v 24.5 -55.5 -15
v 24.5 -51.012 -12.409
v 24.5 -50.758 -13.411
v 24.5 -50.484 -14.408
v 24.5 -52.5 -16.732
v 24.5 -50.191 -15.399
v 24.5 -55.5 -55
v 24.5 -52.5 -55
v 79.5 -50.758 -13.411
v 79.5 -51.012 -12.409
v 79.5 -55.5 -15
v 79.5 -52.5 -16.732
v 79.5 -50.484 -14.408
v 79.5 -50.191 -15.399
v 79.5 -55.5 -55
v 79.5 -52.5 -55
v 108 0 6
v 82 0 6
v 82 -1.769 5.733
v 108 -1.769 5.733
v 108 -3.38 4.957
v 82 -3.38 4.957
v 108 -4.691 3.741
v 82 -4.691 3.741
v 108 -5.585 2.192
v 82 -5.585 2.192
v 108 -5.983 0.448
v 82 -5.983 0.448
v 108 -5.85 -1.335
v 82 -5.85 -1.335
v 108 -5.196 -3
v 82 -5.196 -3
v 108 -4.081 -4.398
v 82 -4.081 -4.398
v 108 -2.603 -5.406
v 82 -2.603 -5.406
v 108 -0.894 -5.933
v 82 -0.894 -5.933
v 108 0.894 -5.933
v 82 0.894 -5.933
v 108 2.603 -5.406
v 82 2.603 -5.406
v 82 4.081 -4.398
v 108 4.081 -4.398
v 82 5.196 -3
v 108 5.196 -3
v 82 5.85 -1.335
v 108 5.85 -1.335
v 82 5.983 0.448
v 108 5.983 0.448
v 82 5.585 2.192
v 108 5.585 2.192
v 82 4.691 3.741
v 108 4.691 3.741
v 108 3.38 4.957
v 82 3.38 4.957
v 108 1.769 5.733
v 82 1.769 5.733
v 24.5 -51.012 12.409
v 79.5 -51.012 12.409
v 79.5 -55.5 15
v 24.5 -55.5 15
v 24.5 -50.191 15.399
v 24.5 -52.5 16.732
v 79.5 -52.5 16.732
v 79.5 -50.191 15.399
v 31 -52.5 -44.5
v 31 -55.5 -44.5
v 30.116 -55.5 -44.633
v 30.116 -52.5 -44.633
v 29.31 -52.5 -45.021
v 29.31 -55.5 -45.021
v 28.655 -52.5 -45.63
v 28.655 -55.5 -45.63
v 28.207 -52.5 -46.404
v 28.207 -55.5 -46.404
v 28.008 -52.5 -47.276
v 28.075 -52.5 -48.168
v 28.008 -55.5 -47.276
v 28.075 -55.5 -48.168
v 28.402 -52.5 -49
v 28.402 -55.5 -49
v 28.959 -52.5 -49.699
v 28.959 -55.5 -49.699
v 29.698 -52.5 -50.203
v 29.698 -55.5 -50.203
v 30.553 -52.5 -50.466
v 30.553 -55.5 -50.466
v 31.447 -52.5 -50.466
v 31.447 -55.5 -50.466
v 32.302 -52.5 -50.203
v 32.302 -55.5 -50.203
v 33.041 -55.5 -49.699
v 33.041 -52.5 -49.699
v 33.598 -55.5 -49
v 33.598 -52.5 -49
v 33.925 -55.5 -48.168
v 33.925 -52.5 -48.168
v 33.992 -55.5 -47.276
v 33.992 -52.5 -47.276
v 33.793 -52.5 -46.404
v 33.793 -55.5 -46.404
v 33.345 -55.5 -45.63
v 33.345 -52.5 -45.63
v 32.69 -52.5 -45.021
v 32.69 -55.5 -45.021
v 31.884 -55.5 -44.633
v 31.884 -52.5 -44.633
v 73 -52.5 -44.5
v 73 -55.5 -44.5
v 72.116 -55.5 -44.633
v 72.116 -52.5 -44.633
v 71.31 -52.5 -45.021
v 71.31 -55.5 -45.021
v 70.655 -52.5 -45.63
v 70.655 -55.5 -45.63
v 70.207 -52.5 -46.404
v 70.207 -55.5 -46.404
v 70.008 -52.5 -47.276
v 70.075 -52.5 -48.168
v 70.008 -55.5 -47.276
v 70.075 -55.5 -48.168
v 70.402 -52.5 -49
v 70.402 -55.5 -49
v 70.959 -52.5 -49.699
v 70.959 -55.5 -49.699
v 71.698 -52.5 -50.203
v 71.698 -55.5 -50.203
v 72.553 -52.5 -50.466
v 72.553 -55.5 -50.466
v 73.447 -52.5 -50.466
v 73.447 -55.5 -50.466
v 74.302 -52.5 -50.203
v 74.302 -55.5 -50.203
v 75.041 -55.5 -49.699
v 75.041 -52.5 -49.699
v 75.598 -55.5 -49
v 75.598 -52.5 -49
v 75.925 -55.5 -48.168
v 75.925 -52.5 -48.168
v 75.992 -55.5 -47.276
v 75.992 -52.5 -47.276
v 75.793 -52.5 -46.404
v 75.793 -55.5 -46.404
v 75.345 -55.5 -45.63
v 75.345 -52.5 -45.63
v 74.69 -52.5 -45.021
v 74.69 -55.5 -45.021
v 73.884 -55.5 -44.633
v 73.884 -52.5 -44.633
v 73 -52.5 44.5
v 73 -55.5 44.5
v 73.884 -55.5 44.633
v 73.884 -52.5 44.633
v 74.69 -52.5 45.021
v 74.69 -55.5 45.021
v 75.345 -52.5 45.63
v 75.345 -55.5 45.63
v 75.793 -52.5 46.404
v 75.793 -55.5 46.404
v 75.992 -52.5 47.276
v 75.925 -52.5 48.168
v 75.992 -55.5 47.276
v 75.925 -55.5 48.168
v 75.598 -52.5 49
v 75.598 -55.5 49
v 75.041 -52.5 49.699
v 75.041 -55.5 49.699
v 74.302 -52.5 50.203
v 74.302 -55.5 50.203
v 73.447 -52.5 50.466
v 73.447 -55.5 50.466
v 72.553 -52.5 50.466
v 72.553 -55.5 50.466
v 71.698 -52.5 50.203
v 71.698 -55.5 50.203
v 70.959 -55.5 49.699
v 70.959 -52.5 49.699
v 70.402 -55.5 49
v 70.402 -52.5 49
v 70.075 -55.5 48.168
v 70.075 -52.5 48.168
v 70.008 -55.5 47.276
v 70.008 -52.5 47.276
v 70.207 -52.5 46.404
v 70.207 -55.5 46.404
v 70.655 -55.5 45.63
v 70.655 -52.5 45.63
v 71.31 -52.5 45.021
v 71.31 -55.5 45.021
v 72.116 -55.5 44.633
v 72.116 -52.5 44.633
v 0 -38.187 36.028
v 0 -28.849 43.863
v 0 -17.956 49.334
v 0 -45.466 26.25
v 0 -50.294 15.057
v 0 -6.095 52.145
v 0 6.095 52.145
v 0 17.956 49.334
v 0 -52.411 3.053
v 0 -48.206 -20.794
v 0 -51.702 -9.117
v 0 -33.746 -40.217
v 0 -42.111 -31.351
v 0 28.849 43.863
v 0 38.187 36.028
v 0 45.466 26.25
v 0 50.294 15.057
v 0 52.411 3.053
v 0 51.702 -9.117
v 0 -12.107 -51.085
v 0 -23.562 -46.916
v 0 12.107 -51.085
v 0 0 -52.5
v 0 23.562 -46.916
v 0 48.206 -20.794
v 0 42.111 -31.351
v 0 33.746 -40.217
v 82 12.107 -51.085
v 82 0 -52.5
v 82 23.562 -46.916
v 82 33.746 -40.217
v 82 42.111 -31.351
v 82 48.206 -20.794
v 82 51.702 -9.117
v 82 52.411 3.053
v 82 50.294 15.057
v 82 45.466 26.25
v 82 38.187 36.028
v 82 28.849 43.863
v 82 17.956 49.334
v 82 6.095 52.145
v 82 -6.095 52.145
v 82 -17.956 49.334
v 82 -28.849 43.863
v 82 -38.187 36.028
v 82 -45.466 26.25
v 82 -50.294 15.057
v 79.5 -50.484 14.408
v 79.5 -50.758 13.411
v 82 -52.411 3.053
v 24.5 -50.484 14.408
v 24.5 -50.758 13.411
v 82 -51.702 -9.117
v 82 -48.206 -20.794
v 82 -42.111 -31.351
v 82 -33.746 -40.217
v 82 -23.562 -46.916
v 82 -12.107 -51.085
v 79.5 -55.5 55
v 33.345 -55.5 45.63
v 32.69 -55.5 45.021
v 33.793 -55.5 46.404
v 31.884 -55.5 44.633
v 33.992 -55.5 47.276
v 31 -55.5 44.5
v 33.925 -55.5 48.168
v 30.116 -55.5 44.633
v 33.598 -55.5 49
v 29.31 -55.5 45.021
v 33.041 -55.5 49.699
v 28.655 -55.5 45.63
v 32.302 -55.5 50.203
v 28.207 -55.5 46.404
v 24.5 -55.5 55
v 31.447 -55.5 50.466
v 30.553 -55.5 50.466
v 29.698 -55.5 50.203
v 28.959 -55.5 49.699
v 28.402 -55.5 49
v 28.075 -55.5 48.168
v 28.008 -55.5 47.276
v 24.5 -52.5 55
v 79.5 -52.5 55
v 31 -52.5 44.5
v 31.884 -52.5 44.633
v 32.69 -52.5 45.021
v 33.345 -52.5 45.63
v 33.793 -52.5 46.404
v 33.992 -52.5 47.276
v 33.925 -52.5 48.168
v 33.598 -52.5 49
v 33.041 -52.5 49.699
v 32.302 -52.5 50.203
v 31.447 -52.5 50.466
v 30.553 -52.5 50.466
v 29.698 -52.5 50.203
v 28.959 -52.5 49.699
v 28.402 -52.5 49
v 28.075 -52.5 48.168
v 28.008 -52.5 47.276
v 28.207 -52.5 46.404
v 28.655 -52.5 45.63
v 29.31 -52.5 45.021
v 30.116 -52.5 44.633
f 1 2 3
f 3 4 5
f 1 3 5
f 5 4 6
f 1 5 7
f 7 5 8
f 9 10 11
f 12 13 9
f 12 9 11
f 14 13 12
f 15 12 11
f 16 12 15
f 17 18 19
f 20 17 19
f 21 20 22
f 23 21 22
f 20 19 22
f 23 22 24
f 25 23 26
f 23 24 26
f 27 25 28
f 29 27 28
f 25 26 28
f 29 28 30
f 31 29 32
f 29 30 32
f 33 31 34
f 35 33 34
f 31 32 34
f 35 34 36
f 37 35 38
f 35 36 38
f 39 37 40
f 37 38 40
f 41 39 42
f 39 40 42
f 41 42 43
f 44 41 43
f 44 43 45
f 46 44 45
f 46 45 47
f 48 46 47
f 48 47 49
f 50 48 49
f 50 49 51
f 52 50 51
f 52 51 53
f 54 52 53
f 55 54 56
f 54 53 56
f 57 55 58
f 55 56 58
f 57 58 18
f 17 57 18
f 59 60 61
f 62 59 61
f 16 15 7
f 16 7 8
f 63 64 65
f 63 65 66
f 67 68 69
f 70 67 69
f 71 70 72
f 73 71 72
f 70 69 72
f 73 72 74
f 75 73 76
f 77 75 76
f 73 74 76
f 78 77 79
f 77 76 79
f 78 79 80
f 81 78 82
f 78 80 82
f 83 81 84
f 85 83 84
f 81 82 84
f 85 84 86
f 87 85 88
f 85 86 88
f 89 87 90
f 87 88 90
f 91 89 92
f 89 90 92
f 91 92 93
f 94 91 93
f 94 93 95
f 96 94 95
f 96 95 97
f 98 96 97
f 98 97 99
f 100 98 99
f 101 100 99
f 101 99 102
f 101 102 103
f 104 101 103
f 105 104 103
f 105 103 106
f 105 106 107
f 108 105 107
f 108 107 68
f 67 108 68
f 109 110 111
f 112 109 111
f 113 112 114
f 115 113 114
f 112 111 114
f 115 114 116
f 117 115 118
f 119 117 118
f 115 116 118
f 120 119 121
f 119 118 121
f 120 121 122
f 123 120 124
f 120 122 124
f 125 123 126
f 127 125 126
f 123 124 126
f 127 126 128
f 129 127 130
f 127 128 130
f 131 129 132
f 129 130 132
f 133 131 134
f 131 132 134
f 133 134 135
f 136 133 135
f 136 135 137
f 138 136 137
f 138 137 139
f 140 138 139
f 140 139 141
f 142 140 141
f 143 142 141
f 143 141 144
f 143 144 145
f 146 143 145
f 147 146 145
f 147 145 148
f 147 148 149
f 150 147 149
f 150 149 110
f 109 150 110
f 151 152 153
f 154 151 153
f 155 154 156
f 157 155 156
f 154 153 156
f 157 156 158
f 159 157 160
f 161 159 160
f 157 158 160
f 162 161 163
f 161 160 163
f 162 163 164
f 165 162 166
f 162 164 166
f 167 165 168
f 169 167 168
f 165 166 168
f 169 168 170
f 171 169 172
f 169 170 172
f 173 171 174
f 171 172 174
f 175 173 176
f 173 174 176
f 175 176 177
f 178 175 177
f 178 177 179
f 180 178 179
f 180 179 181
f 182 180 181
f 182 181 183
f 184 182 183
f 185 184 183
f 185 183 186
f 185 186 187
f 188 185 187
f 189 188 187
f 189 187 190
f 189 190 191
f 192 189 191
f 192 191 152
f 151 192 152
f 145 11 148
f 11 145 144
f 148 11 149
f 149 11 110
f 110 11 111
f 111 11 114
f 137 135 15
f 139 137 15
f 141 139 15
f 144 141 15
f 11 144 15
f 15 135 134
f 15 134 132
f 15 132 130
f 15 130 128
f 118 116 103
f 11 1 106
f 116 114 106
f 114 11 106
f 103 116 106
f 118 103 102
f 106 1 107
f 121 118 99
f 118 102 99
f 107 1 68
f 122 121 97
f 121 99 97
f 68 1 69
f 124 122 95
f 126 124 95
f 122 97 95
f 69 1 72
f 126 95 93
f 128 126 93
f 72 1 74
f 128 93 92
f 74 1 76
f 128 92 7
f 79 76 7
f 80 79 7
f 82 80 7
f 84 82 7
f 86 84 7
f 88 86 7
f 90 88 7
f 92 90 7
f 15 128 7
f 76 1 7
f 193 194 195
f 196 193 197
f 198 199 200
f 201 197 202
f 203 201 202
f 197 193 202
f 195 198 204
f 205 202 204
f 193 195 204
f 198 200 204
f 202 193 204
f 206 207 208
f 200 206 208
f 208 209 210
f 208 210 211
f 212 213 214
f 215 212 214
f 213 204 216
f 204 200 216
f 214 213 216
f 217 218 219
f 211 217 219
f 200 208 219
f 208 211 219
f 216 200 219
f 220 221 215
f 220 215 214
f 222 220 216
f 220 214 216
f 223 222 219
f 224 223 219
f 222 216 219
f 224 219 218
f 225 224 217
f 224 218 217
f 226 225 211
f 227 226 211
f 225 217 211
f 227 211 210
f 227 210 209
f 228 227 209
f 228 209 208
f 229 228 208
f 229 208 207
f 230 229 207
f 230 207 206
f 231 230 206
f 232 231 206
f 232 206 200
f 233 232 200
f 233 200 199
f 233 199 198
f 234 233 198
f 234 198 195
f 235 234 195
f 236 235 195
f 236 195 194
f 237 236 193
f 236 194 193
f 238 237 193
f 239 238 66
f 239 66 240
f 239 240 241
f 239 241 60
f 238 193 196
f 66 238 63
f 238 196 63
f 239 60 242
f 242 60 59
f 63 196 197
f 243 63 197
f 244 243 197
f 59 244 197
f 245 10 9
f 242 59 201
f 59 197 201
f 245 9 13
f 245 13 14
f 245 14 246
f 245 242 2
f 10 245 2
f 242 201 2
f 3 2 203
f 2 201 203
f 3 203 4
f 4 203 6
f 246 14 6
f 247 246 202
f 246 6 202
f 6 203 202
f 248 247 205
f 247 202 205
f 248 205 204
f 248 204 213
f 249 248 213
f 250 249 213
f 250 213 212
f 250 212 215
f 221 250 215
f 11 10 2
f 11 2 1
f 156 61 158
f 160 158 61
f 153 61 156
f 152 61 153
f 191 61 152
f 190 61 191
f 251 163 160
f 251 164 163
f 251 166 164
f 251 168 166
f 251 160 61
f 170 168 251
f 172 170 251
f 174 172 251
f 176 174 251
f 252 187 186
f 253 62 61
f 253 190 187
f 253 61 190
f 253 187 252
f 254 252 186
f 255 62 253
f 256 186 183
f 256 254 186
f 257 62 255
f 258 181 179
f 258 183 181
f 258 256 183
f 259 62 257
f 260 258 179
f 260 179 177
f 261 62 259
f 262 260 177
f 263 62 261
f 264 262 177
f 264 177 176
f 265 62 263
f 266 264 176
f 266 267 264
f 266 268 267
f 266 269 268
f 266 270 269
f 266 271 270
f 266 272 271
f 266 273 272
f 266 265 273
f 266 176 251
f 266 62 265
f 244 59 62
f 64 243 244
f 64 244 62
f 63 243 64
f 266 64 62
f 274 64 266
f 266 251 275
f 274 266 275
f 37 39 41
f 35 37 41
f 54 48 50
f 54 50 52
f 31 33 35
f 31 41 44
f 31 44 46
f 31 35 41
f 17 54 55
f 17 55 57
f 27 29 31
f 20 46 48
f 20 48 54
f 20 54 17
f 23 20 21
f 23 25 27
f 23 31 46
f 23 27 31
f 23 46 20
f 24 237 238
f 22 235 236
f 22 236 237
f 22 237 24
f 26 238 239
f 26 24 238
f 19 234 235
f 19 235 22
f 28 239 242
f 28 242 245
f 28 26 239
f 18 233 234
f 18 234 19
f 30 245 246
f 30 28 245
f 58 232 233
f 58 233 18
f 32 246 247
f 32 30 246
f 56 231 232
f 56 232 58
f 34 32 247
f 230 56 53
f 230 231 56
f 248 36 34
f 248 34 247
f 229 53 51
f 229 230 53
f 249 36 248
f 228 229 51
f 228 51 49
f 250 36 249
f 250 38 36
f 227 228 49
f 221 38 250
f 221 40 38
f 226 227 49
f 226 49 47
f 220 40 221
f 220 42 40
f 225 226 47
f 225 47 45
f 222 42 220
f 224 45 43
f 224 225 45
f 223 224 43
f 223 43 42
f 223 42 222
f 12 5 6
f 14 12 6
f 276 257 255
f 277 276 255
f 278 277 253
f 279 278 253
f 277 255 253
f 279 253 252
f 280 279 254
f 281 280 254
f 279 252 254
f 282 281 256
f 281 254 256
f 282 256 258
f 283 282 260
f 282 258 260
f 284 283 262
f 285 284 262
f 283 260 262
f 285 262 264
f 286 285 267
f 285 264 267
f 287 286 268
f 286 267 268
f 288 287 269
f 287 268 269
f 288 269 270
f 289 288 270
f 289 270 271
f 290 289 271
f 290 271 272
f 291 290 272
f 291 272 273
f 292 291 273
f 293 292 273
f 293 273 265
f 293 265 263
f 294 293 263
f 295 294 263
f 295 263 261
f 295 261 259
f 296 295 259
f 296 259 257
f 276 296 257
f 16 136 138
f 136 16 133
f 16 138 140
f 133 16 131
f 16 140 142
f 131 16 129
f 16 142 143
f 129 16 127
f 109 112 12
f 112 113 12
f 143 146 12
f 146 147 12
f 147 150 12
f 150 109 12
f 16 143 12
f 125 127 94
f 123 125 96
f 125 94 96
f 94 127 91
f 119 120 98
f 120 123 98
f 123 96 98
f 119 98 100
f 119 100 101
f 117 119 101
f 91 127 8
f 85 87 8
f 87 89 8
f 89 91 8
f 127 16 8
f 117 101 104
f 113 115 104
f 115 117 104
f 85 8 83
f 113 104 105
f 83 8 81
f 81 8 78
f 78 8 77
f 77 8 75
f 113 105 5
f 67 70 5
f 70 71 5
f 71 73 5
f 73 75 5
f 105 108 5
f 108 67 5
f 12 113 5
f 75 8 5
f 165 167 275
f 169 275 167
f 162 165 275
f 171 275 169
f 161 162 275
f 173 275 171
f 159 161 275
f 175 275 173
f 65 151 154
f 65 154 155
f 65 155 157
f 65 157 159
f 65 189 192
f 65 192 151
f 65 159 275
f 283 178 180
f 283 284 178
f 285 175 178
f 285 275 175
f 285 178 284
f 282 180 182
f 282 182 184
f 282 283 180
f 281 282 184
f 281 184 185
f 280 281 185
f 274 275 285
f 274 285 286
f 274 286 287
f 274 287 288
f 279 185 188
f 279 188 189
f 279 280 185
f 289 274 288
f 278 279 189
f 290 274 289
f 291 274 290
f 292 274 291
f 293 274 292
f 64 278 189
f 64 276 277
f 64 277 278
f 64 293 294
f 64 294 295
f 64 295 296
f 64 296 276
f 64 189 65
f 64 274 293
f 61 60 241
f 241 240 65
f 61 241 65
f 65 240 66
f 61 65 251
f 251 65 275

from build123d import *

# Parameters (mm, degrees)
SKETCH1_R           = 52.5
BOSS_EXTRUDE1_DEPTH = 82
SKETCH2_R           = 6
BOSS_EXTRUDE2_DEPTH = 26
BOSS_EXTRUDE3_START = -55
BOSS_EXTRUDE3_DEPTH = 55
CUT_EXTRUDE1_REACH  = 164.336
SKETCH4_R           = 3


with BuildPart() as part:
    # Sketch1 → Boss-Extrude1 (new body)
    with BuildSketch(Plane(origin=(0, 0, 0), x_dir=(0, 0, -1), z_dir=(1, 0, 0))):
        Circle(SKETCH1_R)
    extrude(amount=BOSS_EXTRUDE1_DEPTH)

    # Sketch2 → Boss-Extrude2 (add)
    with BuildSketch(Plane(origin=(82, 0, 0), x_dir=(0, 0, -1), z_dir=(1, 0, 0))):
        with Locations(Location((0, 0, 0), (0, 0, 180))):
            Circle(SKETCH2_R)
    extrude(amount=BOSS_EXTRUDE2_DEPTH)

    # Sketch3 → Boss-Extrude3 (add)
    with BuildSketch(Plane(origin=(79.5, 0, 0), x_dir=(0, 0, -1), z_dir=(1, 0, 0)).offset(BOSS_EXTRUDE3_START)):
        with BuildLine():
            Line((-55, -52.5), (-16.732050808, -52.5))
            Line((-16.732050808, -52.5), (-15.398880082, -50.190880568))
            ThreePointArc((-15.398880082, -50.190880568), (-13.910046874, -50.623715746), (-12.409081478, -51.012397482))
            Line((-12.409081478, -51.012397482), (-15, -55.5))
            Line((-15, -55.5), (-55, -55.5))
            Line((-55, -55.5), (-55, -52.5))
        make_face()
        with BuildLine():
            Line((16.732050808, -52.5), (15.398880082, -50.190880568))
            ThreePointArc((15.398880082, -50.190880568), (13.910046874, -50.623715746), (12.409081478, -51.012397482))
            Line((12.409081478, -51.012397482), (15, -55.5))
            Line((15, -55.5), (55, -55.5))
            Line((55, -55.5), (55, -52.5))
            Line((55, -52.5), (16.732050808, -52.5))
        make_face()
    extrude(amount=BOSS_EXTRUDE3_DEPTH)

    # Sketch4 → Cut-Extrude1 (cut, up to next)
    with BuildSketch(Plane.XZ.offset(55.5), mode=Mode.PRIVATE) as cut_extrude1_sk1:
        with Locations(Location((73, 47.5, 0), (0, 0, 270))):
            Circle(SKETCH4_R)
    cut_extrude1_tool1 = extrude(cut_extrude1_sk1.sketch, amount=-CUT_EXTRUDE1_REACH, mode=Mode.PRIVATE) & part.part
    # Sketch4 → Cut-Extrude1 (cut, up to next)
    with BuildSketch(Plane.XZ.offset(55.5), mode=Mode.PRIVATE) as cut_extrude1_sk2:
        with Locations(Location((73, -47.5, 0), (0, 0, 90))):
            Circle(SKETCH4_R)
    cut_extrude1_tool2 = extrude(cut_extrude1_sk2.sketch, amount=-CUT_EXTRUDE1_REACH, mode=Mode.PRIVATE) & part.part
    # Sketch4 → Cut-Extrude1 (cut, up to next)
    with BuildSketch(Plane.XZ.offset(55.5), mode=Mode.PRIVATE) as cut_extrude1_sk3:
        with Locations(Location((31, -47.5, 0), (0, 0, 90))):
            Circle(SKETCH4_R)
    cut_extrude1_tool3 = extrude(cut_extrude1_sk3.sketch, amount=-CUT_EXTRUDE1_REACH, mode=Mode.PRIVATE) & part.part
    # Sketch4 → Cut-Extrude1 (cut, up to next)
    with BuildSketch(Plane.XZ.offset(55.5), mode=Mode.PRIVATE) as cut_extrude1_sk4:
        with Locations(Location((31, 47.5, 0), (0, 0, 270))):
            Circle(SKETCH4_R)
    cut_extrude1_tool4 = extrude(cut_extrude1_sk4.sketch, amount=-CUT_EXTRUDE1_REACH, mode=Mode.PRIVATE) & part.part
    add(cut_extrude1_tool1.solids().sort_by_distance((73, -55.5, 47.5))[0], mode=Mode.SUBTRACT)
    add(cut_extrude1_tool2.solids().sort_by_distance((73, -55.5, -47.5))[0], mode=Mode.SUBTRACT)
    add(cut_extrude1_tool3.solids().sort_by_distance((31, -55.5, -47.5))[0], mode=Mode.SUBTRACT)
    add(cut_extrude1_tool4.solids().sort_by_distance((31, -55.5, 47.5))[0], mode=Mode.SUBTRACT)


solid = part.part
